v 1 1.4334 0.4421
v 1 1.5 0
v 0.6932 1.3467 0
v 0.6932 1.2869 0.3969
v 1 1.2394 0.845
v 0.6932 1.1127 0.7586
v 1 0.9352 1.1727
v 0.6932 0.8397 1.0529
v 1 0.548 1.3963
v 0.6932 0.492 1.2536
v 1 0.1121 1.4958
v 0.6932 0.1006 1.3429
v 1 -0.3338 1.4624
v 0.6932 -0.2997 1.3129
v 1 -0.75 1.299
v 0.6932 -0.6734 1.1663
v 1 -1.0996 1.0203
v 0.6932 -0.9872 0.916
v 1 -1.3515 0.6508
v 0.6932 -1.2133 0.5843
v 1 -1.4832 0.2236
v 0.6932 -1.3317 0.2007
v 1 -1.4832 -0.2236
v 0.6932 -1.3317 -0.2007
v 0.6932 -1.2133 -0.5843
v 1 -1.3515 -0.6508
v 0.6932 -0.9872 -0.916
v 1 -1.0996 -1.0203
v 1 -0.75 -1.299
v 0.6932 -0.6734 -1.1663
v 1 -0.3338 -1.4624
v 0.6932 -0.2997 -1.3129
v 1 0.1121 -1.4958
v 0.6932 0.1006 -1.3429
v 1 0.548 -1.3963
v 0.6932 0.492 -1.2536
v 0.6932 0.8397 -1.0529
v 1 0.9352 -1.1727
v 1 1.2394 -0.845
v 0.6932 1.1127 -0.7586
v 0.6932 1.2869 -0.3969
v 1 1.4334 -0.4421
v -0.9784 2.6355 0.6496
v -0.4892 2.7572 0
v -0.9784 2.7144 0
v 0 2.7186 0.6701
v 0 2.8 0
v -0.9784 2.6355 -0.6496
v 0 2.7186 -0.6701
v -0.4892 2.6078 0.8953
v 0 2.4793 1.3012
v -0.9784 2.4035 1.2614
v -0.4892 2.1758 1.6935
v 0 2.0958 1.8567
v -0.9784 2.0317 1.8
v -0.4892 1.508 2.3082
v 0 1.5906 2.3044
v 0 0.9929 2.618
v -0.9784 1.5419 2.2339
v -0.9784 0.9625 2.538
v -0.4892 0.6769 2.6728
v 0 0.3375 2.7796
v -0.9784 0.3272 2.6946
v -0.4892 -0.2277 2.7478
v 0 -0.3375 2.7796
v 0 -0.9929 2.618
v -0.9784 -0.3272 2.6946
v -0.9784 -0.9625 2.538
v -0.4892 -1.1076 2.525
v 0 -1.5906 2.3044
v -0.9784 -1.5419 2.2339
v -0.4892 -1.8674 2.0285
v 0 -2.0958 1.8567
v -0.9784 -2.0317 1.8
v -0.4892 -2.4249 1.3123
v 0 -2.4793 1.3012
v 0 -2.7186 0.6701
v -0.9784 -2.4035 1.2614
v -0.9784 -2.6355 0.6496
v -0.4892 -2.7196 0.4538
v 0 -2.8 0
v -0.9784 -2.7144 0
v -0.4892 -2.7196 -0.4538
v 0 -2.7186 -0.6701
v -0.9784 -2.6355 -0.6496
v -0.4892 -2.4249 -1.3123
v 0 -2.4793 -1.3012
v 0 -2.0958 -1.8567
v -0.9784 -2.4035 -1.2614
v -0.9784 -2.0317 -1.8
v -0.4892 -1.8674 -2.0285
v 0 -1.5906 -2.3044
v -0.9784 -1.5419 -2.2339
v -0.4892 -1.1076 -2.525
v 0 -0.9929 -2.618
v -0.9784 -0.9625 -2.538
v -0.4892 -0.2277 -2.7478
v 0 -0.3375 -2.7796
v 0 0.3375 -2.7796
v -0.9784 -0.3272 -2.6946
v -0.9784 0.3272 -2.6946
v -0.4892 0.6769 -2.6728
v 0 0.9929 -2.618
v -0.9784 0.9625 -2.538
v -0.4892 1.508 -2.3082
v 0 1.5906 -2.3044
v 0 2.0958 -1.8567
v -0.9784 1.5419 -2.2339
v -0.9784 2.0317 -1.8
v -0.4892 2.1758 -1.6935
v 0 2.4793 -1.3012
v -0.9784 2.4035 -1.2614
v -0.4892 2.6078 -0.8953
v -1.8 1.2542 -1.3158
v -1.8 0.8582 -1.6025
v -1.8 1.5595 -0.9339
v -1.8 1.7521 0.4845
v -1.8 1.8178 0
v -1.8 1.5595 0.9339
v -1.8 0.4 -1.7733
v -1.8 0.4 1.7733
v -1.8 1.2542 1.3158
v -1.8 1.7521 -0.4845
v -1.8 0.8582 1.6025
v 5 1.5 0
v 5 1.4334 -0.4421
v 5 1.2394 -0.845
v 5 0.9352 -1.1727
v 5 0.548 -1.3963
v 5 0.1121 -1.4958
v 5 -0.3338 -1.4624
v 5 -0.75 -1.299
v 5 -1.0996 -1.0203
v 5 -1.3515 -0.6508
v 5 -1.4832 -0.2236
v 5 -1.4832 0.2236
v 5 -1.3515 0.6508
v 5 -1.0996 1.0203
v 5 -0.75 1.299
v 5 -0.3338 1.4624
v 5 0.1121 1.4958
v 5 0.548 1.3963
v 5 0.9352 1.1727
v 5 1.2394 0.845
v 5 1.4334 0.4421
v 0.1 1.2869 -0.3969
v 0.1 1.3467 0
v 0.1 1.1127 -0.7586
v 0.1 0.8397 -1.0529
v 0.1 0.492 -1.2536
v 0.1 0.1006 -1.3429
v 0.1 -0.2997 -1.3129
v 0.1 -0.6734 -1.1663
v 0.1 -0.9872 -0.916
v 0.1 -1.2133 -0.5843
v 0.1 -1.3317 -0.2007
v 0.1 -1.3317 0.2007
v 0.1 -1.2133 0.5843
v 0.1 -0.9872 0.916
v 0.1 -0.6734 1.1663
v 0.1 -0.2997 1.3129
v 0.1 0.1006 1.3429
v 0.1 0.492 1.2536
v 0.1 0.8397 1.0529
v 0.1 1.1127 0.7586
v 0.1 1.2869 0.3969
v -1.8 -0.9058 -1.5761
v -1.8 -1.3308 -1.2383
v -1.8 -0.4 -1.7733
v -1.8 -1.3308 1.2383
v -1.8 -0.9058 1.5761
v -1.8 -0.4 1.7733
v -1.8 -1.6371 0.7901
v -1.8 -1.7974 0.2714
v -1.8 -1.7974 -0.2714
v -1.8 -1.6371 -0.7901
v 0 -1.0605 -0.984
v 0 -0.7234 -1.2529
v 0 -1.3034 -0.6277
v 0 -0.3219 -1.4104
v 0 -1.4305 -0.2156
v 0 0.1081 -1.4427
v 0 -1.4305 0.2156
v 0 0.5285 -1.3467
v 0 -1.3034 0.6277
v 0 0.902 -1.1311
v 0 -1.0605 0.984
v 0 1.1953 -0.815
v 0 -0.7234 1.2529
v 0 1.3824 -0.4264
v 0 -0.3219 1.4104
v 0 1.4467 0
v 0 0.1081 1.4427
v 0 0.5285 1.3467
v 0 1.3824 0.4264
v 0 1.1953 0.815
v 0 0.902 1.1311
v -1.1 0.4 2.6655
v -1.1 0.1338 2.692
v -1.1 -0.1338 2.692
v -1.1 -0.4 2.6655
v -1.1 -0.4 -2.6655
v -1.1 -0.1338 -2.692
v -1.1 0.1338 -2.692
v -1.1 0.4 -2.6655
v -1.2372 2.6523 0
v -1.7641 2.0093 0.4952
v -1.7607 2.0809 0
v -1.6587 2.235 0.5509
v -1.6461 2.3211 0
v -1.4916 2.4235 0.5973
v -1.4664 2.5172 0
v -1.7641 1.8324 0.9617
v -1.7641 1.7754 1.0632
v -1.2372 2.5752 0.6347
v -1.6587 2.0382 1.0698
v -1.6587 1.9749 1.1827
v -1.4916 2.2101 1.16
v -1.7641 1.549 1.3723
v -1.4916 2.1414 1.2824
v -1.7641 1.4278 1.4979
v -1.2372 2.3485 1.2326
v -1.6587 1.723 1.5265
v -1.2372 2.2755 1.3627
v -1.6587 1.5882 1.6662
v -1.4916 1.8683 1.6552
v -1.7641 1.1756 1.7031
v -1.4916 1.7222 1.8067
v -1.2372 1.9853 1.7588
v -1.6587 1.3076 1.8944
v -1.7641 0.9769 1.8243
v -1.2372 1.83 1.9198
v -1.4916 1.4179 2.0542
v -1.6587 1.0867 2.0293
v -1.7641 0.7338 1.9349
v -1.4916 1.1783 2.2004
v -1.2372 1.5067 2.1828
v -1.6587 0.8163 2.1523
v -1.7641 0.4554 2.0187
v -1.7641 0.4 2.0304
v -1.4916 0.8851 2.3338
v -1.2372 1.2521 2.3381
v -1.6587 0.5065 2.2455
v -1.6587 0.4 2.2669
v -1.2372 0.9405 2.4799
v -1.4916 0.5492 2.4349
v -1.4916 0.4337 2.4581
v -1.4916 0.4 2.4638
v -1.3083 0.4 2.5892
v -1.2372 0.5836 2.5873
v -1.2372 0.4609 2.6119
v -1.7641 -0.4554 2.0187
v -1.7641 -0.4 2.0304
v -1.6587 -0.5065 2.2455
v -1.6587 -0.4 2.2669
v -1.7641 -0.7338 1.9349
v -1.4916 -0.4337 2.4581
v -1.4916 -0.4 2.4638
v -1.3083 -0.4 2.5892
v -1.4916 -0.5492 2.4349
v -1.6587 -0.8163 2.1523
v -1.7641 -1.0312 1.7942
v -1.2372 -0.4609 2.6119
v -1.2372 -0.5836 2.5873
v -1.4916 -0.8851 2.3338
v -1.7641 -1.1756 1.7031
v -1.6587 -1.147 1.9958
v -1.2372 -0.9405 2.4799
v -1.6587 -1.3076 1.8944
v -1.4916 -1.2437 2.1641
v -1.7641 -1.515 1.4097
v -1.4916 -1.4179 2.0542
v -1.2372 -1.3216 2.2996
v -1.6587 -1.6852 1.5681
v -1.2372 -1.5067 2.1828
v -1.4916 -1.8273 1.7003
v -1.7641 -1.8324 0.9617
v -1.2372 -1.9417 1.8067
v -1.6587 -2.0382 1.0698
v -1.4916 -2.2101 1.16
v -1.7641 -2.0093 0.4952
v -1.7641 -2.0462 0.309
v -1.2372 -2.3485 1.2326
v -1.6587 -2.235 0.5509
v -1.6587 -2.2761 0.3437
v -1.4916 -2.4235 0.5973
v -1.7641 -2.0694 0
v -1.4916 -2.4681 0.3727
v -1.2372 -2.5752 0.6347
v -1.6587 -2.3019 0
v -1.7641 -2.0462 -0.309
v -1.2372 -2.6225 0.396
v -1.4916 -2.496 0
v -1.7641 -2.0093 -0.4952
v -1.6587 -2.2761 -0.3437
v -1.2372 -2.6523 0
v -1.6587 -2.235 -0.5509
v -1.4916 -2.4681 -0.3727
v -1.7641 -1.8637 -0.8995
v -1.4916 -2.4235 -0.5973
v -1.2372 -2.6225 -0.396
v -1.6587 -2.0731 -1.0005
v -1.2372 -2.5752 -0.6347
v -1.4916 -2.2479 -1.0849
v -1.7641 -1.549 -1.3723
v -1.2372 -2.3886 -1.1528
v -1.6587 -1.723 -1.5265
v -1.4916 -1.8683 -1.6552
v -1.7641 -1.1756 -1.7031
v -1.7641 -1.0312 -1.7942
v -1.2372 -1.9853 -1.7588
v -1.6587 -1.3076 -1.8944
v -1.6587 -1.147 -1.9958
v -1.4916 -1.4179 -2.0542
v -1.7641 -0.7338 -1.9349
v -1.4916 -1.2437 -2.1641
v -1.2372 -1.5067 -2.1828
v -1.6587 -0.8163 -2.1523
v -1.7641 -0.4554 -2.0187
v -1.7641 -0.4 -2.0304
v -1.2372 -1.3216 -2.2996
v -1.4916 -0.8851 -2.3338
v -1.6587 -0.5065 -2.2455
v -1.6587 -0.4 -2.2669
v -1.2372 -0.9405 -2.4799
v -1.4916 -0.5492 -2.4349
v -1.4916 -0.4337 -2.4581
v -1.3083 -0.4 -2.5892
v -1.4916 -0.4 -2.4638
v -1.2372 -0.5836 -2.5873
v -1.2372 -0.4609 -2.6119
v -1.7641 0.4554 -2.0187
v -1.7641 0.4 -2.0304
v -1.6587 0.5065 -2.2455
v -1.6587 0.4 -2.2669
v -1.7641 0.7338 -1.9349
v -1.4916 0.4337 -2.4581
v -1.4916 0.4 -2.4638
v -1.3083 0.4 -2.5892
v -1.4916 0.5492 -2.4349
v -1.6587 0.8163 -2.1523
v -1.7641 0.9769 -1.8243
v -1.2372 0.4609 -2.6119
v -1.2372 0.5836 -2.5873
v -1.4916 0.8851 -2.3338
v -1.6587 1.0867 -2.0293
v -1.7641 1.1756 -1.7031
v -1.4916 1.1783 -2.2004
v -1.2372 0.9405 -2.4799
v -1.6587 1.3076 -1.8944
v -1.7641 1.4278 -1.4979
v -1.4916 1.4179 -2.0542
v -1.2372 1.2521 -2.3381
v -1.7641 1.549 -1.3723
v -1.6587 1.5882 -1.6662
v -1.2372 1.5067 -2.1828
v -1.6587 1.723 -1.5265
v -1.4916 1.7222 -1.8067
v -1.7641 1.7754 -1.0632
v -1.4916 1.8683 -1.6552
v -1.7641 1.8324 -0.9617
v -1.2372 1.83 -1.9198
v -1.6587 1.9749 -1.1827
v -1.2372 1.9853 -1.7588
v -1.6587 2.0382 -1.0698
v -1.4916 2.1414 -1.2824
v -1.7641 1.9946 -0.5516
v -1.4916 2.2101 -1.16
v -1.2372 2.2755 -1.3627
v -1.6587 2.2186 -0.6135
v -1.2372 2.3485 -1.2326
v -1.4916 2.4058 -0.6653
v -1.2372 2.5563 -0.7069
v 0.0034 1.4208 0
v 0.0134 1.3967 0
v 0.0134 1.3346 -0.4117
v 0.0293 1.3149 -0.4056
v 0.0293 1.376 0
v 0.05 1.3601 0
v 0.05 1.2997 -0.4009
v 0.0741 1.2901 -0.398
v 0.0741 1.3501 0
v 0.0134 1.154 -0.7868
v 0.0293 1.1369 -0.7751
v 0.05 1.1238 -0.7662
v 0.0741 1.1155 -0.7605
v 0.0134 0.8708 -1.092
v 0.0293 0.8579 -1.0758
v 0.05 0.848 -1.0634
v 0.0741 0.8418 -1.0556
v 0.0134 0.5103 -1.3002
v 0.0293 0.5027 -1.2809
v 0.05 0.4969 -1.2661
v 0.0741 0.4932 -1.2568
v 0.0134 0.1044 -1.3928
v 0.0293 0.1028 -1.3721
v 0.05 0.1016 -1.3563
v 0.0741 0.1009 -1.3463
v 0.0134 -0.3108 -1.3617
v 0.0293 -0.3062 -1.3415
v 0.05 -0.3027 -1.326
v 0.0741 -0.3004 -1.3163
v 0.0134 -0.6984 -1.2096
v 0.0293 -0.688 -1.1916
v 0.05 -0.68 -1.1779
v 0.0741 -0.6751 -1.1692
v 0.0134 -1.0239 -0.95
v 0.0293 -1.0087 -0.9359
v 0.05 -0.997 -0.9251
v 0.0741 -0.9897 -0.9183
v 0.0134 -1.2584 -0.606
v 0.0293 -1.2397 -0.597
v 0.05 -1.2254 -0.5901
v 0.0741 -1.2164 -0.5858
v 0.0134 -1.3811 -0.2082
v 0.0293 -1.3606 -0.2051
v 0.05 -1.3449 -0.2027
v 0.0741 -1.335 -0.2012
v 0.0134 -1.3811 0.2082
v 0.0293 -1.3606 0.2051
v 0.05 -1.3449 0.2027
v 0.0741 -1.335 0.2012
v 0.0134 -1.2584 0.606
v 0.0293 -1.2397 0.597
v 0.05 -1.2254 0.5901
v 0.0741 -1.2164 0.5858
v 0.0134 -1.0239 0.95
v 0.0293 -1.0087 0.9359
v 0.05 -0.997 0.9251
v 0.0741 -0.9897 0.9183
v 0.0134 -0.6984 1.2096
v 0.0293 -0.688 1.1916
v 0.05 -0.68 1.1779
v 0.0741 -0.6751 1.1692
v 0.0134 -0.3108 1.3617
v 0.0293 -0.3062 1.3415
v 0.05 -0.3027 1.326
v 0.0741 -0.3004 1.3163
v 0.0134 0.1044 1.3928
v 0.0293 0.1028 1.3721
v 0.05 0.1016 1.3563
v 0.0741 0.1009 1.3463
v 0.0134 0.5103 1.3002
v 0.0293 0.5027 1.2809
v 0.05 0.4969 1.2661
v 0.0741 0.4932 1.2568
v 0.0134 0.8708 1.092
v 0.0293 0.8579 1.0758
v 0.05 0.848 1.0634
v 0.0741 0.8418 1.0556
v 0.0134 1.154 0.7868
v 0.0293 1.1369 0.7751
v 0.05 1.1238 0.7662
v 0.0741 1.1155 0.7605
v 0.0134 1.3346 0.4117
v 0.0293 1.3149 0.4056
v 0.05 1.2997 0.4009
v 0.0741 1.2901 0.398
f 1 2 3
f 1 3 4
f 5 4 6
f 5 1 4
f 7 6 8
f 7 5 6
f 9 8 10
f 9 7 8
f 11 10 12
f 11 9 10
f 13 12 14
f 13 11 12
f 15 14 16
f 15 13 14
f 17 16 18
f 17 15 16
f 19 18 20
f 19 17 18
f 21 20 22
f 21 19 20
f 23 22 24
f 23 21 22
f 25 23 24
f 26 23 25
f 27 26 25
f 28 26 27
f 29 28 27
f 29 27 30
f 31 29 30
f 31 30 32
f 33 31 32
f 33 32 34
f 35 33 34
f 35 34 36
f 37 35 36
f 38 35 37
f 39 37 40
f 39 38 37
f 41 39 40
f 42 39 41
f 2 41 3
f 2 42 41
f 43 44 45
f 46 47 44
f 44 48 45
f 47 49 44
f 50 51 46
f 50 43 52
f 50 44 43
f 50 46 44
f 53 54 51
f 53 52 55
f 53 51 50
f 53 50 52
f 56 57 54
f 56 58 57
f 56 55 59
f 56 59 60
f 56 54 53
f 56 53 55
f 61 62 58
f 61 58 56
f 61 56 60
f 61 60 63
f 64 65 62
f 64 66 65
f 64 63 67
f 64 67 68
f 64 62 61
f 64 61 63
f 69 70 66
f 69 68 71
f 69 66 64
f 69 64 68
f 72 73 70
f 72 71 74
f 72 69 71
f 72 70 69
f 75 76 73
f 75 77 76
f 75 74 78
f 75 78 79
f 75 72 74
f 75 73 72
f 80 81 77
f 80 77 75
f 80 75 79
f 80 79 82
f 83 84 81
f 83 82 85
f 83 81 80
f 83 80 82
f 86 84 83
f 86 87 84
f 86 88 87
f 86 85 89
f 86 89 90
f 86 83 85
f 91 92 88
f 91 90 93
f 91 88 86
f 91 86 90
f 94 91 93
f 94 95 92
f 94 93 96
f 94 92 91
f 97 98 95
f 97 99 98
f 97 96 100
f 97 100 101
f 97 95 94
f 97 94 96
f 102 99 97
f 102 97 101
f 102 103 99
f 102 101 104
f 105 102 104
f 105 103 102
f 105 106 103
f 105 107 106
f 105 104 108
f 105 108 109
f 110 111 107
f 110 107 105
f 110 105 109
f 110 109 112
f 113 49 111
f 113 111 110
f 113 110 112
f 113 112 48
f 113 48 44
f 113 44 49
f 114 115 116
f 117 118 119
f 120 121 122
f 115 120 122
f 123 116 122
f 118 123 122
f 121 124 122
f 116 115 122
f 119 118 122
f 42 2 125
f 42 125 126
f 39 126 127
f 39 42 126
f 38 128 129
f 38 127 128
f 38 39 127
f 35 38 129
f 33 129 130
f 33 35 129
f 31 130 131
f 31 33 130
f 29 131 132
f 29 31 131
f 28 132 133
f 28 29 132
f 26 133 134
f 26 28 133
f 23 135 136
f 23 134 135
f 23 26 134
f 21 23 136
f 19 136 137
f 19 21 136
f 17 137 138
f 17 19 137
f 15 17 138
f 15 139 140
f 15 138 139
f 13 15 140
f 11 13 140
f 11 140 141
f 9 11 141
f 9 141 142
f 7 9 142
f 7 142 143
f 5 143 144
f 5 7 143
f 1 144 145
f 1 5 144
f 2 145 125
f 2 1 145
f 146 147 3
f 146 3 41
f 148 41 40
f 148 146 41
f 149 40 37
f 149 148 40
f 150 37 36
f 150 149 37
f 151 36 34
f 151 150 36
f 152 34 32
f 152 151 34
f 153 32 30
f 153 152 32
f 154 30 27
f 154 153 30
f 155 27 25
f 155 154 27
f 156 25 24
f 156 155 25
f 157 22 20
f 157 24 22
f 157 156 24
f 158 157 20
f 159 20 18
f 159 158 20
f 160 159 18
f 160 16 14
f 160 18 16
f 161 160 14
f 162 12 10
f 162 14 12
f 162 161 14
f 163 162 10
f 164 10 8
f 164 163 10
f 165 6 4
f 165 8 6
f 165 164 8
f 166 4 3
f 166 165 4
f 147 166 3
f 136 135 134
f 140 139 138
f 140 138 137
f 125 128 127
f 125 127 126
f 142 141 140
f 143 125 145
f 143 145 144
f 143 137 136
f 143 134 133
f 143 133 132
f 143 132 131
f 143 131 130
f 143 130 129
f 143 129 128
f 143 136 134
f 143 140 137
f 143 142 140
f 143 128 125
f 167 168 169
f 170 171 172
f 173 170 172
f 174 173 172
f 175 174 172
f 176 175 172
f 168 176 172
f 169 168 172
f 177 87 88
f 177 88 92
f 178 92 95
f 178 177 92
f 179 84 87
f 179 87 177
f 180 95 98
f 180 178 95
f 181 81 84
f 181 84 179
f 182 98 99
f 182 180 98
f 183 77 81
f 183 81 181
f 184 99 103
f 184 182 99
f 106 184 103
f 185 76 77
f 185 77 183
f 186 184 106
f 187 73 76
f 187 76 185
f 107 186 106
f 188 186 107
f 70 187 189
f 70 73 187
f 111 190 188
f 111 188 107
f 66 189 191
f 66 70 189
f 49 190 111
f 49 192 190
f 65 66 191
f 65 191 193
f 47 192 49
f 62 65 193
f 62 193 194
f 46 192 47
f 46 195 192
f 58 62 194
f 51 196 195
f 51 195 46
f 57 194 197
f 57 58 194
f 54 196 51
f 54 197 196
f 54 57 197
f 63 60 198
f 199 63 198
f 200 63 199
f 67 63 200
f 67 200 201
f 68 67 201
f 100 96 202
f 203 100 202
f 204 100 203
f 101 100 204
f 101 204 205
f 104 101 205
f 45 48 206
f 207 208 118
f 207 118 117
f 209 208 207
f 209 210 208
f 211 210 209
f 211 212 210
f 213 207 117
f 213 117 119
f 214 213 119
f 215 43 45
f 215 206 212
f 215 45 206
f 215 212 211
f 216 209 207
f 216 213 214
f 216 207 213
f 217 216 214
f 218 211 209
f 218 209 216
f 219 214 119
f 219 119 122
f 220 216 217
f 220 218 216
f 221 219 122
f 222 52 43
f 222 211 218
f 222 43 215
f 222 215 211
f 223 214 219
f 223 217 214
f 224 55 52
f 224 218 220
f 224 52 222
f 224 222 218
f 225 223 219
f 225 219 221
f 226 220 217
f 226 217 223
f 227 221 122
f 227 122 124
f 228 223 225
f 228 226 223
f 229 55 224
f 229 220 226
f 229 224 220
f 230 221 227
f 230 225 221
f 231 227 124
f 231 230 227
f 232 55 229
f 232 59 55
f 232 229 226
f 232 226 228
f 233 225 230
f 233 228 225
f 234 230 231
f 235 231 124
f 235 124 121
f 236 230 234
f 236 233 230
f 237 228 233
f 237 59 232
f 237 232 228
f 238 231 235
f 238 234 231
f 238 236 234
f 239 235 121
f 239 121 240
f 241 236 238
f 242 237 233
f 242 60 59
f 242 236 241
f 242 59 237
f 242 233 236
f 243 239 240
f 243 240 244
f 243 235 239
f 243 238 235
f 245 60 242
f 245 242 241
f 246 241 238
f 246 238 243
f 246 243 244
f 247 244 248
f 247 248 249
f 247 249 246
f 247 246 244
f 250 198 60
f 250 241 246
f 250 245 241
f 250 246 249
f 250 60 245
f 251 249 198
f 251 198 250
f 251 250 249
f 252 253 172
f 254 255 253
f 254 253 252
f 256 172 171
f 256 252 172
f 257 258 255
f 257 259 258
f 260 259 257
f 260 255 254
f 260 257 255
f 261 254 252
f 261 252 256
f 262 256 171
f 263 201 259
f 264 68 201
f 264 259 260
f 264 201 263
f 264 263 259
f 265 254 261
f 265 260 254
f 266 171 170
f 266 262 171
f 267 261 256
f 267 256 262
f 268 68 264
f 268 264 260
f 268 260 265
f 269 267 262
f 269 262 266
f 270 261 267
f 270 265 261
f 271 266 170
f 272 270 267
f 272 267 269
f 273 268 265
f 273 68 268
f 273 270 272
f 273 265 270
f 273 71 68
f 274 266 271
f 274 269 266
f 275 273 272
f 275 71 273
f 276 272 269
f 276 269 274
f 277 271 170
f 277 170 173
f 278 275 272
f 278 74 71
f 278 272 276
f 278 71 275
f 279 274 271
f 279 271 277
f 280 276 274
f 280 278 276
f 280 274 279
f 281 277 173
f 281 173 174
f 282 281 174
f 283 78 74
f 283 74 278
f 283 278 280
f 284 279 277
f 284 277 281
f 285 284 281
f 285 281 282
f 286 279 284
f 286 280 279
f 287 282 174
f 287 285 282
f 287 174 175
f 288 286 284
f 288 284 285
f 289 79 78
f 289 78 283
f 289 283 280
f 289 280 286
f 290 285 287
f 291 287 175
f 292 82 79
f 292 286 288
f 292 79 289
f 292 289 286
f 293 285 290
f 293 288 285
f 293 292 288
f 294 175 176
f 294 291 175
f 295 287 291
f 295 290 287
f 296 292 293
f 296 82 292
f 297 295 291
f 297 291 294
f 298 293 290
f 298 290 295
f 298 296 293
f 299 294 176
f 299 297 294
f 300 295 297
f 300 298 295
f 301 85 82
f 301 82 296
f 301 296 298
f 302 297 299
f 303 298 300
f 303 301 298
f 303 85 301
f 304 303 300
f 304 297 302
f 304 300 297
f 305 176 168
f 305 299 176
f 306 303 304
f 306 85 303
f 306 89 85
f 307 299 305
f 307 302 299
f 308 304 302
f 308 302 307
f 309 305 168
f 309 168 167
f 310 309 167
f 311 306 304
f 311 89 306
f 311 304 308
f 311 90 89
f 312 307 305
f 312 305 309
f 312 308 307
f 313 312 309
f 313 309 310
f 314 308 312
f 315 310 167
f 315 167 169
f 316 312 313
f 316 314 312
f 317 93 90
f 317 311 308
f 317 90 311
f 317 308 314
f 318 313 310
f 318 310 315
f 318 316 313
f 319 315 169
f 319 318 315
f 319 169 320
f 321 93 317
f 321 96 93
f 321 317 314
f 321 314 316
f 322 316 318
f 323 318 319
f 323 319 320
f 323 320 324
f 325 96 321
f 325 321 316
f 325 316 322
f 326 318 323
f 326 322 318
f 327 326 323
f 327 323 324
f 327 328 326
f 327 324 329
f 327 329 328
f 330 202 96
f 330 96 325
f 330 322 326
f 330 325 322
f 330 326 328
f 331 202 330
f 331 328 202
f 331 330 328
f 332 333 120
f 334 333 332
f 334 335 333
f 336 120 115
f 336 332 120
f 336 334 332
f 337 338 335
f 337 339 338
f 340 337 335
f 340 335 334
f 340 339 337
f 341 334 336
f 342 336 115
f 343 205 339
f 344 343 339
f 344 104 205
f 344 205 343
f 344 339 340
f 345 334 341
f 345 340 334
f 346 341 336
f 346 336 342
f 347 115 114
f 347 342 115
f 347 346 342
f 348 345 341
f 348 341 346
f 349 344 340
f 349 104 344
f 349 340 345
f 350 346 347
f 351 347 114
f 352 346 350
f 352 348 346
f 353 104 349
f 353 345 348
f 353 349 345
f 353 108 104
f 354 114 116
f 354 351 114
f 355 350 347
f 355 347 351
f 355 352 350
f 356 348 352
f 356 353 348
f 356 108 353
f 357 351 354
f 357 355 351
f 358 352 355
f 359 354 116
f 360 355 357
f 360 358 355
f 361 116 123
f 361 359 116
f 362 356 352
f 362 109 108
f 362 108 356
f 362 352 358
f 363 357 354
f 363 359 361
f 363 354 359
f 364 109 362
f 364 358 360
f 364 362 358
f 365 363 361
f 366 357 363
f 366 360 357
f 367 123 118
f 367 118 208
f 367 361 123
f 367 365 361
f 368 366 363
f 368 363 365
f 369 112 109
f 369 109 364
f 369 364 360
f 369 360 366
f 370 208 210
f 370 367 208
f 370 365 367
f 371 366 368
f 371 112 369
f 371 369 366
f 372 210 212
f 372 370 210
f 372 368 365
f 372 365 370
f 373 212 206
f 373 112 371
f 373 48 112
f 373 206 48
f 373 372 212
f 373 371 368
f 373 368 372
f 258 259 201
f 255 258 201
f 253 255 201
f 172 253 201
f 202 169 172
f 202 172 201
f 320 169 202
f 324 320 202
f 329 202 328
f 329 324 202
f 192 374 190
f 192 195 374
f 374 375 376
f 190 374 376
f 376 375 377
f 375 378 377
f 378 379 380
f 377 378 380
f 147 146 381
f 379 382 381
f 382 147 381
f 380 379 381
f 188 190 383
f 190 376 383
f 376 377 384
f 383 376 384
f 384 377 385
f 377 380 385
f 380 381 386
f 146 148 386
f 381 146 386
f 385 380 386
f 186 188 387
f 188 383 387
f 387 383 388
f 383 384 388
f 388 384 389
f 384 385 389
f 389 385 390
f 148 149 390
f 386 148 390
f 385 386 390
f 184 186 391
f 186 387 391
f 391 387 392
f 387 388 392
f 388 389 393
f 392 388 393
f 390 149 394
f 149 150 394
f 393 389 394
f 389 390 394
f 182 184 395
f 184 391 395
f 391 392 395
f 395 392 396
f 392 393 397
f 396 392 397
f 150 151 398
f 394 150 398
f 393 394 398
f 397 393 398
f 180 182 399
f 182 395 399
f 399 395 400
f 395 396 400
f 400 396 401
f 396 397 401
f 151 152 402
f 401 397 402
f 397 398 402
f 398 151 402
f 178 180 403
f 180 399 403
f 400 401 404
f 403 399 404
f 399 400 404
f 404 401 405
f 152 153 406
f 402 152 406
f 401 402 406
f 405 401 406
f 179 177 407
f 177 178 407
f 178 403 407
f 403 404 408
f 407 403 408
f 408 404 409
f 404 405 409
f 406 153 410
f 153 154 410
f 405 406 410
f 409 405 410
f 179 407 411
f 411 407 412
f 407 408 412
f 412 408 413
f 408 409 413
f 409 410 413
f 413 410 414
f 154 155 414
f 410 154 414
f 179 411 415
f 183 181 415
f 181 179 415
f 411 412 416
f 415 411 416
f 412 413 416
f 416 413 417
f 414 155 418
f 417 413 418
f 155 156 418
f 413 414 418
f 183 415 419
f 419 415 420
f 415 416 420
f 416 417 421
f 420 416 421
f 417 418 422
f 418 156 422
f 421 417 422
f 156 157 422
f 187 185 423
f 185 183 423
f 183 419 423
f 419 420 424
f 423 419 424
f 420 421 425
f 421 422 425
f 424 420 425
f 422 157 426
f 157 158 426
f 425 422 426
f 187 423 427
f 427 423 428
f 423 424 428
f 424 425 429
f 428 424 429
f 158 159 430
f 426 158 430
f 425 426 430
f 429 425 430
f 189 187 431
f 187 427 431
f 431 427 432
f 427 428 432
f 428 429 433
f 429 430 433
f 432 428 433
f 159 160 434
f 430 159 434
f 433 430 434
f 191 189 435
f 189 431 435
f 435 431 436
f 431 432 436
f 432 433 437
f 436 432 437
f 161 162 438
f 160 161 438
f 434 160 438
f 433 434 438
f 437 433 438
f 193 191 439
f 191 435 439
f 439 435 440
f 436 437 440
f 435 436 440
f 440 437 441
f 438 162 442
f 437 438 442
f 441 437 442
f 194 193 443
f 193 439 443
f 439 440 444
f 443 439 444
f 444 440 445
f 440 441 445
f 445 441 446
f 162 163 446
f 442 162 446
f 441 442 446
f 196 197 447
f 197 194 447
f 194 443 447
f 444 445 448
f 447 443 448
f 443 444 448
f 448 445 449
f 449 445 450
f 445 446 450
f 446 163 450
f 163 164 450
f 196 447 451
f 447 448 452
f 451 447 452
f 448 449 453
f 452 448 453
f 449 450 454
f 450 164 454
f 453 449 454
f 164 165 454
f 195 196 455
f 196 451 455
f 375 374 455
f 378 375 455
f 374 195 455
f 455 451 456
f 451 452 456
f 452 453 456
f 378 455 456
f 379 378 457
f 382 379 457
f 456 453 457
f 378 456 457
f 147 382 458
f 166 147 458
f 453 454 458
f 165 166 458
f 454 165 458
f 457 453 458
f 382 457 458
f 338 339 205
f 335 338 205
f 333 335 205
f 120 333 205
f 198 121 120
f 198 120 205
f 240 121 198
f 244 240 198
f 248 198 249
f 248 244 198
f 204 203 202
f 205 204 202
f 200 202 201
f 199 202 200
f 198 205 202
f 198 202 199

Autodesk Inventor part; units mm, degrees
ref_plane "YZ Plane" through (0, 0, 0) normal (1, 0, 0) x (0, 1, 0)
ref_plane "XZ Plane" through (0, 0, 0) normal (0, 1, 0) x (-1, 0, 0)
sketch "Skizze1" plane through (0, 0, 0) normal (0, 0, 1) x (1, 0, 0)
  line L0 (-1.8, 0) -> (5, 0)
  line L1 (5, 0) -> (5, 1.5)
  line L2 (5, 1.5) -> (1, 1.5)
  line L3 (1, 1.5) -> (0.6932, 1.3467)
  line L4 (0.6932, 1.3467) -> (0, 1.3467)
  line L5 (0, 1.3467) -> (0, 2.8)
  line L6 (-3.16, 0) -> (6.36, 0) projected
  line L7 (0, -0.56) -> (0, 3.36) projected
  line L8 (-1.8, 0) -> (-1.8, 2.6425)
  line L9 (0, 2.8) -> (-1.8, 2.6425)
  line L10 (1, 1.5) -> (0, 1.5) construction
  dimension "d0" = 5
  dimension "d1" = 4
  dimension "d2" = 0.3068
  dimension "d3" = 1.8
  dimension "d4" = 3
  dimension "d5" = 2.6935
  dimension "d9" = 5.6
  dimension "d10" = 5
revolve "Körper" add sketch "Skizze1" angle 360 about axis through (-1.8, 0, 0) along (1, 0, 0)
sketch "Skizze2" plane through (-1.8, 0, 0) normal (-1, 0, 0) x (0, 0, 1)
  circle A0 centre (0, 0) radius 2.8 projected
  line L0 (0, 0) -> (0, 2.6425) projected
  line L1 (-2.8, 0.4) -> (2.8, 0.4)
  line L2 (2.8, 0.4) -> (2.8, -0.4)
  line L3 (2.8, -0.4) -> (-2.8, -0.4)
  line L4 (-2.8, -0.4) -> (-2.8, 0.4)
  line L5 (-2.8, 0) -> (2.8, 0) construction
  line L6 (0, 0.4) -> (0, -0.4) construction
  dimension "d11" = 0.8
  dimension "d12" = 5.6
fillet "Rundung1" radius 0.9 1 edges at (-1.8, -2.6425, 0)
extrude "Loch" cut sketch "Skizze2" against normal blind 0.7 contours A0 L3 L1 | L2 L3 A0 | A0 L1 L2 | A0 L4 L1 | L3 L4 A0
thread "Gewinde" size "M3x0.5" class "6g" standard "ISO Metric profile" length 4
ref_plane "Work Plane1" through (30.1625, 0, 0) normal (0, 0, -1) x (1, 0, 0)
fillet "Fillet5" radius 0.1 1 edges at (0, -1.3467, 0)
equation "\"d11\" = SBR"
equation "\"d12\" = KOD"
equation "\"d14\" = RR"
equation "\"d19\" = STI"
equation "\"d15\" = GEL"
equation "\"d41\" = R"
equation "\"d0\" = NLG"
equation "\"d1\" = GEL"
equation "\"d3\" = KOH"
equation "\"d4\" = GD"
equation "\"d5\" = BDM"
equation "\"d9\" = KOD"
equation "\"d10\" = KEWI"
equation "\"GD\" = NND"
equation "\"NLG\" = 5"
equation "\"GEL\" = 4"
equation "\"KOD\" = 5.6"
equation "\"KOH\" = 1.8"
equation "\"GAL\" = 0.61345 * PTC"
equation "\"R\" = 0.1"
equation "\"BDM\" = 2.6935"
equation "\"GUL\" = 0.61345 * PTC"
equation "\"RR\" = 0.9"
equation "\"SBR\" = 0.8"
equation "\"STI\" = 0.7"
equation "\"KEWI\" = 5deg"
equation "\"PTC\" = 0.5"
equation "\"THREADDIA\" = 3"
equation "\"TOA\" = 30deg"
equation "\"NND\" = 3"
equation "\"GD1\" = THREADDIA - 1.2269 * PTC"
properties part number "ISO 1580 - M3 x 5" material "Stahl, weich"
